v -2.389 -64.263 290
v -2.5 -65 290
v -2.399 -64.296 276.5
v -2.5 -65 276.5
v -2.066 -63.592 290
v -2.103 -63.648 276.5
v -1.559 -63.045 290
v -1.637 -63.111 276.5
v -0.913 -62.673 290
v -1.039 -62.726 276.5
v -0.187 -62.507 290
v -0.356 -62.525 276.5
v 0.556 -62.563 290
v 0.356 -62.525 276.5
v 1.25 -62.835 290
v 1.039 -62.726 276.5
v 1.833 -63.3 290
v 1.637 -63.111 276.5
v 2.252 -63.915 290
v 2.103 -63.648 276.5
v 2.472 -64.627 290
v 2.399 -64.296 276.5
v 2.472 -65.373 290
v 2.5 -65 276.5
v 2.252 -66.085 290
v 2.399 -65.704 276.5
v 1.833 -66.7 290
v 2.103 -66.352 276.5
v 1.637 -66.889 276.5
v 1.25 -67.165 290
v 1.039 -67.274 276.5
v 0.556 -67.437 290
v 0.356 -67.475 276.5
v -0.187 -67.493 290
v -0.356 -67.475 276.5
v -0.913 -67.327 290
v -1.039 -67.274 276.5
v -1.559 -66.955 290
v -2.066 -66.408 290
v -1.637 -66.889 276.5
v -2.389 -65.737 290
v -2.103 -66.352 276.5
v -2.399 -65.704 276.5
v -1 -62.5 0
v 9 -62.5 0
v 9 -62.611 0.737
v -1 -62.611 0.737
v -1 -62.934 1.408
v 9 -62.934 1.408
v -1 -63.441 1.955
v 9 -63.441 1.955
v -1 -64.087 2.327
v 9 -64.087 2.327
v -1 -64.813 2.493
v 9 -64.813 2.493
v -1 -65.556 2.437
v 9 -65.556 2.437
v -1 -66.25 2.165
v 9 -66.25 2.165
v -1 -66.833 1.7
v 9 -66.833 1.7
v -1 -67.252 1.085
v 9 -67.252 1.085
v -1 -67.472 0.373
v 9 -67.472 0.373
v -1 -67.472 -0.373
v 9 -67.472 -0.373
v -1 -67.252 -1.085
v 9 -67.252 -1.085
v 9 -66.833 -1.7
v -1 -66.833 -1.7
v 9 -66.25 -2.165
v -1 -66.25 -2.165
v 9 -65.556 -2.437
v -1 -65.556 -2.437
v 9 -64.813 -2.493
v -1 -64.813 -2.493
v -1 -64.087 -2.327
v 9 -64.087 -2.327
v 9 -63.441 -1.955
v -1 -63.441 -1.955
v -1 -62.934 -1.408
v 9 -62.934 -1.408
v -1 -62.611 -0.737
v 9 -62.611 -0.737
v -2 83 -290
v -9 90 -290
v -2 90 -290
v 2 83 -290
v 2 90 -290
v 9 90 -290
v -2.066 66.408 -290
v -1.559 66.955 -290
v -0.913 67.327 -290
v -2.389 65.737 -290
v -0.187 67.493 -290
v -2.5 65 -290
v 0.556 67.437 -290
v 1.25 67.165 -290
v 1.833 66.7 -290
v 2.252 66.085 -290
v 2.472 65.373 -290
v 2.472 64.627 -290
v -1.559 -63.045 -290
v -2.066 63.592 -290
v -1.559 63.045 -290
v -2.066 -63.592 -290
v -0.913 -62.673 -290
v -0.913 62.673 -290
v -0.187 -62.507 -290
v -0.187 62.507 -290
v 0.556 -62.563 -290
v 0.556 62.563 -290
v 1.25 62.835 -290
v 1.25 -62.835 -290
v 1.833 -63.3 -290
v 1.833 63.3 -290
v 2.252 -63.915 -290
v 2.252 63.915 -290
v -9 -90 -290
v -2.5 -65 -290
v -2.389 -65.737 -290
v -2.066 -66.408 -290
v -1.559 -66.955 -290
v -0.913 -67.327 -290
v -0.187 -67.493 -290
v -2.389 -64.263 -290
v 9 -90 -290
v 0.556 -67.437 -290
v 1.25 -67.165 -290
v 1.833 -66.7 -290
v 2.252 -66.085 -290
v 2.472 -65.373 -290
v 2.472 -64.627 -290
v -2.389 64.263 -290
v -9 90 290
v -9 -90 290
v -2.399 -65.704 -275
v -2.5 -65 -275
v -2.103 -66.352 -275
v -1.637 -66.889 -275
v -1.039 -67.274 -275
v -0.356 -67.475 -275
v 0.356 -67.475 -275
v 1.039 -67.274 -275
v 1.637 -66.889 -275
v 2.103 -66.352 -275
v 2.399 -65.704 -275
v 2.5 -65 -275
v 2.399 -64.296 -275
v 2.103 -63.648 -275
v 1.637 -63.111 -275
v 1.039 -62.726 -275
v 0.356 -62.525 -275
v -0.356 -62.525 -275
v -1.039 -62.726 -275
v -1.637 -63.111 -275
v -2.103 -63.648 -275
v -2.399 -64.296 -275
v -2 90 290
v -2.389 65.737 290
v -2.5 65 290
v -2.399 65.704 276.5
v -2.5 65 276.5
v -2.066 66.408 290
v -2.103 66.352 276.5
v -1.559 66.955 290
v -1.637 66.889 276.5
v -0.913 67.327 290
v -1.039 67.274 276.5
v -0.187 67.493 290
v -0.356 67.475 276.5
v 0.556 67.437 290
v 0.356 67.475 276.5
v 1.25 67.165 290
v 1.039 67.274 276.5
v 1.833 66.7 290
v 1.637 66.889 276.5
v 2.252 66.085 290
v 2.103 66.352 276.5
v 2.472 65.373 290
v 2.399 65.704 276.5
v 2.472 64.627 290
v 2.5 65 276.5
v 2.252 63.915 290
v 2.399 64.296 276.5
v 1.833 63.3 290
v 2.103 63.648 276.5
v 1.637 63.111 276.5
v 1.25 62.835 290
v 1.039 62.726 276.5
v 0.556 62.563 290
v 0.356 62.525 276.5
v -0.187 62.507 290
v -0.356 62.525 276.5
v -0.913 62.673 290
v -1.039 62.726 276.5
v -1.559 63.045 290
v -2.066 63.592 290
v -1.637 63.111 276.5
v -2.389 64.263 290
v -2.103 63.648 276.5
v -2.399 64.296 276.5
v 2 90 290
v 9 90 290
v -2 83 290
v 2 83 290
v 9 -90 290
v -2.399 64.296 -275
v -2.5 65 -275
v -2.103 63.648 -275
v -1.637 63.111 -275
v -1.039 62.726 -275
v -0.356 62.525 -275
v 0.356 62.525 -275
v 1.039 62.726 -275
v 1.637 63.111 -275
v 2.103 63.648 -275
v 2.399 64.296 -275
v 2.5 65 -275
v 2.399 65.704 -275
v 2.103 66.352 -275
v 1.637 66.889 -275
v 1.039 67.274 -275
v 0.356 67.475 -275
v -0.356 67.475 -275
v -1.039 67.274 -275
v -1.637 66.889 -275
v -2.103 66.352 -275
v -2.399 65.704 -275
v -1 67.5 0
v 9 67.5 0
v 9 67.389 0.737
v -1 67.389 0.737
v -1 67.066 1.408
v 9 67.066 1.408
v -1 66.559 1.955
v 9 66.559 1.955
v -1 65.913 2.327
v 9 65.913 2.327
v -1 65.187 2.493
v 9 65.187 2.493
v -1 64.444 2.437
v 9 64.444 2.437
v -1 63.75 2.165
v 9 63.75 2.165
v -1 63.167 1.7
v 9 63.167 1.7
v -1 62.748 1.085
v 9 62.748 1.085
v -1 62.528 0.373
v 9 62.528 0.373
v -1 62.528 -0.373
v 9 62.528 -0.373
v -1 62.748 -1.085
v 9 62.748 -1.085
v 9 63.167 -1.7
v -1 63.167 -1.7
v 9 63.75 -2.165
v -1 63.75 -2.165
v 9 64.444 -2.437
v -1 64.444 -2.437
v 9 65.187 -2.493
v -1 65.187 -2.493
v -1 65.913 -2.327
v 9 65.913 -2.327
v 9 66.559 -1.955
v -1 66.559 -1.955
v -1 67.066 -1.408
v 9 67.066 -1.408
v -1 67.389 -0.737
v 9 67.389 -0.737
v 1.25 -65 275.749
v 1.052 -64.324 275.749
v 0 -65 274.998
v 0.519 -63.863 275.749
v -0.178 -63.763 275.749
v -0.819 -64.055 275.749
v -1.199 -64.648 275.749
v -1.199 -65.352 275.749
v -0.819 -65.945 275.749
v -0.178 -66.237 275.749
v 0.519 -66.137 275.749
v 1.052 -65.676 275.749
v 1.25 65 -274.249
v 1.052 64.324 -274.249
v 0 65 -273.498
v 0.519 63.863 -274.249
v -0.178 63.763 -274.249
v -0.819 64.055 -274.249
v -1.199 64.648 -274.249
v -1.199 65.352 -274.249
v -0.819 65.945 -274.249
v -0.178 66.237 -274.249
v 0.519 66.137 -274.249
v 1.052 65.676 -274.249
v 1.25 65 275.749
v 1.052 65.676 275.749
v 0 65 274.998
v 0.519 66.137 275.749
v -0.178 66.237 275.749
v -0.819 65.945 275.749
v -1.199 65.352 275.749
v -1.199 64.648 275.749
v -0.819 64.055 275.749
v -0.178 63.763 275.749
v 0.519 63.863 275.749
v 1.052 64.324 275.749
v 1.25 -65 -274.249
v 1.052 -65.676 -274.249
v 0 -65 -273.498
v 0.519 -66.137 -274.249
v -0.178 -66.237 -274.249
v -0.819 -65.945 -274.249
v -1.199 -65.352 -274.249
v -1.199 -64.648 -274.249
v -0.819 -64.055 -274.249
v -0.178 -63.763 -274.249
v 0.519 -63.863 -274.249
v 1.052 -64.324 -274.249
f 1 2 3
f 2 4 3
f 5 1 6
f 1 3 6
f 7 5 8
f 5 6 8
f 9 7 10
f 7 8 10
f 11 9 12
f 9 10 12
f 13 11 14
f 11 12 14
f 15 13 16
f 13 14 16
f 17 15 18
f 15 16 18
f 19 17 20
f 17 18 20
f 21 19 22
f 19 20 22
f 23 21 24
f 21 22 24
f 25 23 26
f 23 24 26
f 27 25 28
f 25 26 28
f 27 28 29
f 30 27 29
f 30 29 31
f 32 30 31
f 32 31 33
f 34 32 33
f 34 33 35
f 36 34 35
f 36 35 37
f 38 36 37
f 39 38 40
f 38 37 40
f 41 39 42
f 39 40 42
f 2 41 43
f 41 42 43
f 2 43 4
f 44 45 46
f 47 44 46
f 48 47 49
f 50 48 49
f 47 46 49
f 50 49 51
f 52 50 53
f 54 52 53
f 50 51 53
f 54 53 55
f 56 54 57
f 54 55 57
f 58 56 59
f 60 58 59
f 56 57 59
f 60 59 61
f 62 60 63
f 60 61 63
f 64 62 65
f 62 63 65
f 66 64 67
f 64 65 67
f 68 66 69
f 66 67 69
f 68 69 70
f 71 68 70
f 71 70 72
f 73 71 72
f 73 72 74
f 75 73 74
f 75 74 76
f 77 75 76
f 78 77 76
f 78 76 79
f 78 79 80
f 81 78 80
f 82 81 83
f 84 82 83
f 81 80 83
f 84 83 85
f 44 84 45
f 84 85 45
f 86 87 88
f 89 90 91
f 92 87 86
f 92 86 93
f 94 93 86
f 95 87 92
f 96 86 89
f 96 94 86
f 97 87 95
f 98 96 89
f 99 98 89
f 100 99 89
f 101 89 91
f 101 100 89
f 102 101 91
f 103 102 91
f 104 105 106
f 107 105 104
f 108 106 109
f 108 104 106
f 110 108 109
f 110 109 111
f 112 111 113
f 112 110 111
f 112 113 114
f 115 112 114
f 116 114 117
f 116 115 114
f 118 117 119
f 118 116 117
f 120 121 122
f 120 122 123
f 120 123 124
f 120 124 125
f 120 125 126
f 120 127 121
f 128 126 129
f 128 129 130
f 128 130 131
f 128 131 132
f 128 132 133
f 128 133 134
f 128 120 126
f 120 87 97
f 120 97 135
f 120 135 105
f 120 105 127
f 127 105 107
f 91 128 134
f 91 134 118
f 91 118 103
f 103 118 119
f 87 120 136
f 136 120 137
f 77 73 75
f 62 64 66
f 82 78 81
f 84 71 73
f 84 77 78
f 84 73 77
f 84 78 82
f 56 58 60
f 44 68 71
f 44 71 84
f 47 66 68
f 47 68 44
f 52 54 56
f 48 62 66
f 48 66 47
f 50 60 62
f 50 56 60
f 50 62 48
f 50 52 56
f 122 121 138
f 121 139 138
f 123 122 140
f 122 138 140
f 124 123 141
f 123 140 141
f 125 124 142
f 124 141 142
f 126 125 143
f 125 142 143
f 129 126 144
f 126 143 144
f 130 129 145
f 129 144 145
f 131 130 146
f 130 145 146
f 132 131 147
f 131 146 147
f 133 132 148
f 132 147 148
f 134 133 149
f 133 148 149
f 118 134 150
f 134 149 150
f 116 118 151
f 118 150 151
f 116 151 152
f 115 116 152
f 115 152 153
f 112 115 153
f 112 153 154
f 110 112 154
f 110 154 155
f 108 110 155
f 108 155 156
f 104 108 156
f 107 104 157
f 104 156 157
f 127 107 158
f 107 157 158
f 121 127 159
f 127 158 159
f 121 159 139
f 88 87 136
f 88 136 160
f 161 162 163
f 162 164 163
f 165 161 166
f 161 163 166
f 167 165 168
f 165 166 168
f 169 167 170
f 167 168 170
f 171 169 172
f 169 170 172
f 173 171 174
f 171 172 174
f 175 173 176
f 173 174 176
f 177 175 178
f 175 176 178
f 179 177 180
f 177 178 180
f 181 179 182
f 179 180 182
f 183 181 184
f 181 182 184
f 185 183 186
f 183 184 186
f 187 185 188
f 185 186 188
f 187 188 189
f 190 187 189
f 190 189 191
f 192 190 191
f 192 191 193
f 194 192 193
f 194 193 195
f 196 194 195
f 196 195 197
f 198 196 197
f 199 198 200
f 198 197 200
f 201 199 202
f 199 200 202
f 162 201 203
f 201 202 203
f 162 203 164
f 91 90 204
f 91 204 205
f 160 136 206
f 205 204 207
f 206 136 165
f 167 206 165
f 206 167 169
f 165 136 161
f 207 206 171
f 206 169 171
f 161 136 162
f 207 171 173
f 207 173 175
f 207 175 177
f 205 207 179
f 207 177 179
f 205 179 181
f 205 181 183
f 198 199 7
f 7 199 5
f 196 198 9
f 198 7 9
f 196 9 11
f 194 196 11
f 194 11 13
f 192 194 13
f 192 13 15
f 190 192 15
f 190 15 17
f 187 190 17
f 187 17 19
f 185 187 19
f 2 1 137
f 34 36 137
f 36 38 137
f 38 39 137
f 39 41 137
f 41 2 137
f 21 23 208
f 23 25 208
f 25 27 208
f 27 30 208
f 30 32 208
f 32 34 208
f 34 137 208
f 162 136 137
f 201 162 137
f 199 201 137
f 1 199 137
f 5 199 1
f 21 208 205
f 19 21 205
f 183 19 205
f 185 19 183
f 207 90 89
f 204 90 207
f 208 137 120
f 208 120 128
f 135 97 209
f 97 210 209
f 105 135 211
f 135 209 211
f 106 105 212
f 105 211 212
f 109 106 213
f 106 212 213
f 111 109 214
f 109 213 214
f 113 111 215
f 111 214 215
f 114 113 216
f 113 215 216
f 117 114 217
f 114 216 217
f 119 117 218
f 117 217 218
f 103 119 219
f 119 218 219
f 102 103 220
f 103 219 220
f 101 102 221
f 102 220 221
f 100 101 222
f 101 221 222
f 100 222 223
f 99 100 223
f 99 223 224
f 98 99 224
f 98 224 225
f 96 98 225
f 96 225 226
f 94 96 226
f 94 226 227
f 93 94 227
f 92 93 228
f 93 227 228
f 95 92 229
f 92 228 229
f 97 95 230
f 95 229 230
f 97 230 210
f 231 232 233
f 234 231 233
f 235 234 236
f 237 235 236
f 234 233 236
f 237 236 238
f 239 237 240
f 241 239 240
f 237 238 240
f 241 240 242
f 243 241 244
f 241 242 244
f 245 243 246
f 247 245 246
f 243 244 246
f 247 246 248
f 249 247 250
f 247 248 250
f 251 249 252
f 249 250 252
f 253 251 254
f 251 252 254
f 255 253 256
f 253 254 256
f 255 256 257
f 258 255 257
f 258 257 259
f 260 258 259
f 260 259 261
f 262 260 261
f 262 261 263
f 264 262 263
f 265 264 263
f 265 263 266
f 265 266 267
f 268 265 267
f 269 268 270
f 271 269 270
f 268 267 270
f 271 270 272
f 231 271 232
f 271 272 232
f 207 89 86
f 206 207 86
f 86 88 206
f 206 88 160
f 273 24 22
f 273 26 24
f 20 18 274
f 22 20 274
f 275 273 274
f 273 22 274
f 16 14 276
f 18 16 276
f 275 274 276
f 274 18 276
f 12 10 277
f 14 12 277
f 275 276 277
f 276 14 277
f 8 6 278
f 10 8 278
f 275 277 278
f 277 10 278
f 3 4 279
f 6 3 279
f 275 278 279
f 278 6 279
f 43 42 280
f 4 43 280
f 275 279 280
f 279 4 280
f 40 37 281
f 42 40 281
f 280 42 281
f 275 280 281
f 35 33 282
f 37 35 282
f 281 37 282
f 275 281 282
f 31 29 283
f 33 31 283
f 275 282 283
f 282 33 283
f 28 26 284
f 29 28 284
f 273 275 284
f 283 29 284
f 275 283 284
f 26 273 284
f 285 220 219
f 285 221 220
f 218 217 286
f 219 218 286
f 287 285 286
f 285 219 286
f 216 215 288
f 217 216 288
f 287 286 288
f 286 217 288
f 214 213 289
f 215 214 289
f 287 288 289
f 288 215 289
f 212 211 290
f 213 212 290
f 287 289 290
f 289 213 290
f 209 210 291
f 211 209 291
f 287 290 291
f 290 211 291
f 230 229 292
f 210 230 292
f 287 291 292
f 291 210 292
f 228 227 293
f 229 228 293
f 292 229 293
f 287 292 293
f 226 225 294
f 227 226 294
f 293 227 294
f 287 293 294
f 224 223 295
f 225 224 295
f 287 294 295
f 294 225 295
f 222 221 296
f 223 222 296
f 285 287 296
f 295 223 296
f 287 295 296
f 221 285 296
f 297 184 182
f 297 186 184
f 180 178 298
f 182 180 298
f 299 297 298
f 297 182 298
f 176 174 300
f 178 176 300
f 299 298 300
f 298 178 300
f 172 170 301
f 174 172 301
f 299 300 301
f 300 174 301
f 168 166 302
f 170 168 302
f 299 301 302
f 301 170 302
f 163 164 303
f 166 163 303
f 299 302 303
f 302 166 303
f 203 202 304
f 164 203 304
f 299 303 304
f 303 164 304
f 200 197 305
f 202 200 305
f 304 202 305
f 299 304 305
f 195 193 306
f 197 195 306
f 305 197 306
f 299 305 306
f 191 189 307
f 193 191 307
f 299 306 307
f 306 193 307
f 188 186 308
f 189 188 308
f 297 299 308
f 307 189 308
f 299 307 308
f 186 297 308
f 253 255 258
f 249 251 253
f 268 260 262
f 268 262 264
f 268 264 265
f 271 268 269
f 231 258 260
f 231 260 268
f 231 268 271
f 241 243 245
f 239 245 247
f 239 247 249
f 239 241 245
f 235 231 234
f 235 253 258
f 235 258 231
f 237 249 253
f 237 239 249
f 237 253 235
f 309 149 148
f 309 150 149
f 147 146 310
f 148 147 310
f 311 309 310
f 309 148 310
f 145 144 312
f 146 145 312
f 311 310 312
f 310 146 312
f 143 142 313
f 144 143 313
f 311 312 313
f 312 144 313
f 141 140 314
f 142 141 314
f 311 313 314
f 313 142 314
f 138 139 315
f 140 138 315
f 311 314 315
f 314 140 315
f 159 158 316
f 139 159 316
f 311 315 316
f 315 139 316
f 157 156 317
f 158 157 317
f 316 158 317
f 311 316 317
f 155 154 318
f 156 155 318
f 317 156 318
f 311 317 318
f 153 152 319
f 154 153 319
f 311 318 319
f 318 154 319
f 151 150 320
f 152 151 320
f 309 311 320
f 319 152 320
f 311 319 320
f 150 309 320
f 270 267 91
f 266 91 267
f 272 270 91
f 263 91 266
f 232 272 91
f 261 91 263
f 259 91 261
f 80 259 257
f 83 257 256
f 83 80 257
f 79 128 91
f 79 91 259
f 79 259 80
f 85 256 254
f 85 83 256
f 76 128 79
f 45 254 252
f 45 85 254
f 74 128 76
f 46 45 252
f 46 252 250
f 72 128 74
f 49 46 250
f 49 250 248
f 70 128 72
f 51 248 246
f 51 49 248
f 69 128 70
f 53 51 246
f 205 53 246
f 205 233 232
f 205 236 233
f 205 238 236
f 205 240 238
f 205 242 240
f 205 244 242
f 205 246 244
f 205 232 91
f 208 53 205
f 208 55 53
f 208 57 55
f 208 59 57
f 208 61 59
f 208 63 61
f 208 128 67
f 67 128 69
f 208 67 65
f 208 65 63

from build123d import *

# Parameters (mm, degrees)
F0_W      = 18
F0_H      = 580
F1_DEPTH  = 90
F3_D      = 5
F3_DEPTH  = 13.5
F3_TIP    = 1.5021515476
F5_D      = 5
F5_DEPTH  = 15
F5_TIP    = 1.5021515476
F6_W      = 180
F6_H      = 580
F6_R      = 2.5
F7_DEPTH  = 10
F8_R      = 2.5
F9_DEPTH  = 10
F10_W     = 4
F10_H     = 580
F11_DEPTH = 7


with BuildPart() as f1:
    # F0 (on Front) → F1 (new body, symmetric)
    with BuildSketch(Plane.XZ):
        Rectangle(F0_W, F0_H)
    extrude(amount=F1_DEPTH, both=True)

    # F3
    with Locations(Plane.XY.offset(290)):
        with Locations((0, 65), (0, -65)):
            Hole(F3_D / 2, depth=F3_DEPTH)
            with Locations((0, 0, -(F3_DEPTH + F3_TIP / 2))):  # 118° drill point
                Cone(0, F3_D / 2, F3_TIP, mode=Mode.SUBTRACT)

    # F5
    with Locations(Plane(origin=(0, 0, -290), x_dir=(1, 0, 0), z_dir=(0, 0, -1))):
        with Locations((0, 65), (0, -65)):
            Hole(F5_D / 2, depth=F5_DEPTH)
            with Locations((0, 0, -(F5_DEPTH + F5_TIP / 2))):  # 118° drill point
                Cone(0, F5_D / 2, F5_TIP, mode=Mode.SUBTRACT)

    # F6 (on face) → F7 (cut)
    with BuildSketch(Plane.YZ.offset(9)):
        Rectangle(F6_W, F6_H)
        with Locations((-60, 0)):
            Circle(F6_R, mode=Mode.SUBTRACT)
        with Locations((60, 0)):
            Circle(F6_R, mode=Mode.SUBTRACT)
    extrude(amount=F7_DEPTH, mode=Mode.SUBTRACT)

    # F8 (on face) → F9 (cut)
    with BuildSketch(Plane.YZ.offset(9)):
        with Locations((-65, 0)):
            Circle(F8_R)
        with Locations((65, 0)):
            Circle(F8_R)
    extrude(amount=-F9_DEPTH, mode=Mode.SUBTRACT)

    # F10 (on face) → F11 (cut)
    with BuildSketch(Plane(origin=(0, 90, 0), x_dir=(-1, 0, 0), z_dir=(0, 1, 0))):
        Rectangle(F10_W, F10_H)
    extrude(amount=-F11_DEPTH, mode=Mode.SUBTRACT)


solid = f1.part
